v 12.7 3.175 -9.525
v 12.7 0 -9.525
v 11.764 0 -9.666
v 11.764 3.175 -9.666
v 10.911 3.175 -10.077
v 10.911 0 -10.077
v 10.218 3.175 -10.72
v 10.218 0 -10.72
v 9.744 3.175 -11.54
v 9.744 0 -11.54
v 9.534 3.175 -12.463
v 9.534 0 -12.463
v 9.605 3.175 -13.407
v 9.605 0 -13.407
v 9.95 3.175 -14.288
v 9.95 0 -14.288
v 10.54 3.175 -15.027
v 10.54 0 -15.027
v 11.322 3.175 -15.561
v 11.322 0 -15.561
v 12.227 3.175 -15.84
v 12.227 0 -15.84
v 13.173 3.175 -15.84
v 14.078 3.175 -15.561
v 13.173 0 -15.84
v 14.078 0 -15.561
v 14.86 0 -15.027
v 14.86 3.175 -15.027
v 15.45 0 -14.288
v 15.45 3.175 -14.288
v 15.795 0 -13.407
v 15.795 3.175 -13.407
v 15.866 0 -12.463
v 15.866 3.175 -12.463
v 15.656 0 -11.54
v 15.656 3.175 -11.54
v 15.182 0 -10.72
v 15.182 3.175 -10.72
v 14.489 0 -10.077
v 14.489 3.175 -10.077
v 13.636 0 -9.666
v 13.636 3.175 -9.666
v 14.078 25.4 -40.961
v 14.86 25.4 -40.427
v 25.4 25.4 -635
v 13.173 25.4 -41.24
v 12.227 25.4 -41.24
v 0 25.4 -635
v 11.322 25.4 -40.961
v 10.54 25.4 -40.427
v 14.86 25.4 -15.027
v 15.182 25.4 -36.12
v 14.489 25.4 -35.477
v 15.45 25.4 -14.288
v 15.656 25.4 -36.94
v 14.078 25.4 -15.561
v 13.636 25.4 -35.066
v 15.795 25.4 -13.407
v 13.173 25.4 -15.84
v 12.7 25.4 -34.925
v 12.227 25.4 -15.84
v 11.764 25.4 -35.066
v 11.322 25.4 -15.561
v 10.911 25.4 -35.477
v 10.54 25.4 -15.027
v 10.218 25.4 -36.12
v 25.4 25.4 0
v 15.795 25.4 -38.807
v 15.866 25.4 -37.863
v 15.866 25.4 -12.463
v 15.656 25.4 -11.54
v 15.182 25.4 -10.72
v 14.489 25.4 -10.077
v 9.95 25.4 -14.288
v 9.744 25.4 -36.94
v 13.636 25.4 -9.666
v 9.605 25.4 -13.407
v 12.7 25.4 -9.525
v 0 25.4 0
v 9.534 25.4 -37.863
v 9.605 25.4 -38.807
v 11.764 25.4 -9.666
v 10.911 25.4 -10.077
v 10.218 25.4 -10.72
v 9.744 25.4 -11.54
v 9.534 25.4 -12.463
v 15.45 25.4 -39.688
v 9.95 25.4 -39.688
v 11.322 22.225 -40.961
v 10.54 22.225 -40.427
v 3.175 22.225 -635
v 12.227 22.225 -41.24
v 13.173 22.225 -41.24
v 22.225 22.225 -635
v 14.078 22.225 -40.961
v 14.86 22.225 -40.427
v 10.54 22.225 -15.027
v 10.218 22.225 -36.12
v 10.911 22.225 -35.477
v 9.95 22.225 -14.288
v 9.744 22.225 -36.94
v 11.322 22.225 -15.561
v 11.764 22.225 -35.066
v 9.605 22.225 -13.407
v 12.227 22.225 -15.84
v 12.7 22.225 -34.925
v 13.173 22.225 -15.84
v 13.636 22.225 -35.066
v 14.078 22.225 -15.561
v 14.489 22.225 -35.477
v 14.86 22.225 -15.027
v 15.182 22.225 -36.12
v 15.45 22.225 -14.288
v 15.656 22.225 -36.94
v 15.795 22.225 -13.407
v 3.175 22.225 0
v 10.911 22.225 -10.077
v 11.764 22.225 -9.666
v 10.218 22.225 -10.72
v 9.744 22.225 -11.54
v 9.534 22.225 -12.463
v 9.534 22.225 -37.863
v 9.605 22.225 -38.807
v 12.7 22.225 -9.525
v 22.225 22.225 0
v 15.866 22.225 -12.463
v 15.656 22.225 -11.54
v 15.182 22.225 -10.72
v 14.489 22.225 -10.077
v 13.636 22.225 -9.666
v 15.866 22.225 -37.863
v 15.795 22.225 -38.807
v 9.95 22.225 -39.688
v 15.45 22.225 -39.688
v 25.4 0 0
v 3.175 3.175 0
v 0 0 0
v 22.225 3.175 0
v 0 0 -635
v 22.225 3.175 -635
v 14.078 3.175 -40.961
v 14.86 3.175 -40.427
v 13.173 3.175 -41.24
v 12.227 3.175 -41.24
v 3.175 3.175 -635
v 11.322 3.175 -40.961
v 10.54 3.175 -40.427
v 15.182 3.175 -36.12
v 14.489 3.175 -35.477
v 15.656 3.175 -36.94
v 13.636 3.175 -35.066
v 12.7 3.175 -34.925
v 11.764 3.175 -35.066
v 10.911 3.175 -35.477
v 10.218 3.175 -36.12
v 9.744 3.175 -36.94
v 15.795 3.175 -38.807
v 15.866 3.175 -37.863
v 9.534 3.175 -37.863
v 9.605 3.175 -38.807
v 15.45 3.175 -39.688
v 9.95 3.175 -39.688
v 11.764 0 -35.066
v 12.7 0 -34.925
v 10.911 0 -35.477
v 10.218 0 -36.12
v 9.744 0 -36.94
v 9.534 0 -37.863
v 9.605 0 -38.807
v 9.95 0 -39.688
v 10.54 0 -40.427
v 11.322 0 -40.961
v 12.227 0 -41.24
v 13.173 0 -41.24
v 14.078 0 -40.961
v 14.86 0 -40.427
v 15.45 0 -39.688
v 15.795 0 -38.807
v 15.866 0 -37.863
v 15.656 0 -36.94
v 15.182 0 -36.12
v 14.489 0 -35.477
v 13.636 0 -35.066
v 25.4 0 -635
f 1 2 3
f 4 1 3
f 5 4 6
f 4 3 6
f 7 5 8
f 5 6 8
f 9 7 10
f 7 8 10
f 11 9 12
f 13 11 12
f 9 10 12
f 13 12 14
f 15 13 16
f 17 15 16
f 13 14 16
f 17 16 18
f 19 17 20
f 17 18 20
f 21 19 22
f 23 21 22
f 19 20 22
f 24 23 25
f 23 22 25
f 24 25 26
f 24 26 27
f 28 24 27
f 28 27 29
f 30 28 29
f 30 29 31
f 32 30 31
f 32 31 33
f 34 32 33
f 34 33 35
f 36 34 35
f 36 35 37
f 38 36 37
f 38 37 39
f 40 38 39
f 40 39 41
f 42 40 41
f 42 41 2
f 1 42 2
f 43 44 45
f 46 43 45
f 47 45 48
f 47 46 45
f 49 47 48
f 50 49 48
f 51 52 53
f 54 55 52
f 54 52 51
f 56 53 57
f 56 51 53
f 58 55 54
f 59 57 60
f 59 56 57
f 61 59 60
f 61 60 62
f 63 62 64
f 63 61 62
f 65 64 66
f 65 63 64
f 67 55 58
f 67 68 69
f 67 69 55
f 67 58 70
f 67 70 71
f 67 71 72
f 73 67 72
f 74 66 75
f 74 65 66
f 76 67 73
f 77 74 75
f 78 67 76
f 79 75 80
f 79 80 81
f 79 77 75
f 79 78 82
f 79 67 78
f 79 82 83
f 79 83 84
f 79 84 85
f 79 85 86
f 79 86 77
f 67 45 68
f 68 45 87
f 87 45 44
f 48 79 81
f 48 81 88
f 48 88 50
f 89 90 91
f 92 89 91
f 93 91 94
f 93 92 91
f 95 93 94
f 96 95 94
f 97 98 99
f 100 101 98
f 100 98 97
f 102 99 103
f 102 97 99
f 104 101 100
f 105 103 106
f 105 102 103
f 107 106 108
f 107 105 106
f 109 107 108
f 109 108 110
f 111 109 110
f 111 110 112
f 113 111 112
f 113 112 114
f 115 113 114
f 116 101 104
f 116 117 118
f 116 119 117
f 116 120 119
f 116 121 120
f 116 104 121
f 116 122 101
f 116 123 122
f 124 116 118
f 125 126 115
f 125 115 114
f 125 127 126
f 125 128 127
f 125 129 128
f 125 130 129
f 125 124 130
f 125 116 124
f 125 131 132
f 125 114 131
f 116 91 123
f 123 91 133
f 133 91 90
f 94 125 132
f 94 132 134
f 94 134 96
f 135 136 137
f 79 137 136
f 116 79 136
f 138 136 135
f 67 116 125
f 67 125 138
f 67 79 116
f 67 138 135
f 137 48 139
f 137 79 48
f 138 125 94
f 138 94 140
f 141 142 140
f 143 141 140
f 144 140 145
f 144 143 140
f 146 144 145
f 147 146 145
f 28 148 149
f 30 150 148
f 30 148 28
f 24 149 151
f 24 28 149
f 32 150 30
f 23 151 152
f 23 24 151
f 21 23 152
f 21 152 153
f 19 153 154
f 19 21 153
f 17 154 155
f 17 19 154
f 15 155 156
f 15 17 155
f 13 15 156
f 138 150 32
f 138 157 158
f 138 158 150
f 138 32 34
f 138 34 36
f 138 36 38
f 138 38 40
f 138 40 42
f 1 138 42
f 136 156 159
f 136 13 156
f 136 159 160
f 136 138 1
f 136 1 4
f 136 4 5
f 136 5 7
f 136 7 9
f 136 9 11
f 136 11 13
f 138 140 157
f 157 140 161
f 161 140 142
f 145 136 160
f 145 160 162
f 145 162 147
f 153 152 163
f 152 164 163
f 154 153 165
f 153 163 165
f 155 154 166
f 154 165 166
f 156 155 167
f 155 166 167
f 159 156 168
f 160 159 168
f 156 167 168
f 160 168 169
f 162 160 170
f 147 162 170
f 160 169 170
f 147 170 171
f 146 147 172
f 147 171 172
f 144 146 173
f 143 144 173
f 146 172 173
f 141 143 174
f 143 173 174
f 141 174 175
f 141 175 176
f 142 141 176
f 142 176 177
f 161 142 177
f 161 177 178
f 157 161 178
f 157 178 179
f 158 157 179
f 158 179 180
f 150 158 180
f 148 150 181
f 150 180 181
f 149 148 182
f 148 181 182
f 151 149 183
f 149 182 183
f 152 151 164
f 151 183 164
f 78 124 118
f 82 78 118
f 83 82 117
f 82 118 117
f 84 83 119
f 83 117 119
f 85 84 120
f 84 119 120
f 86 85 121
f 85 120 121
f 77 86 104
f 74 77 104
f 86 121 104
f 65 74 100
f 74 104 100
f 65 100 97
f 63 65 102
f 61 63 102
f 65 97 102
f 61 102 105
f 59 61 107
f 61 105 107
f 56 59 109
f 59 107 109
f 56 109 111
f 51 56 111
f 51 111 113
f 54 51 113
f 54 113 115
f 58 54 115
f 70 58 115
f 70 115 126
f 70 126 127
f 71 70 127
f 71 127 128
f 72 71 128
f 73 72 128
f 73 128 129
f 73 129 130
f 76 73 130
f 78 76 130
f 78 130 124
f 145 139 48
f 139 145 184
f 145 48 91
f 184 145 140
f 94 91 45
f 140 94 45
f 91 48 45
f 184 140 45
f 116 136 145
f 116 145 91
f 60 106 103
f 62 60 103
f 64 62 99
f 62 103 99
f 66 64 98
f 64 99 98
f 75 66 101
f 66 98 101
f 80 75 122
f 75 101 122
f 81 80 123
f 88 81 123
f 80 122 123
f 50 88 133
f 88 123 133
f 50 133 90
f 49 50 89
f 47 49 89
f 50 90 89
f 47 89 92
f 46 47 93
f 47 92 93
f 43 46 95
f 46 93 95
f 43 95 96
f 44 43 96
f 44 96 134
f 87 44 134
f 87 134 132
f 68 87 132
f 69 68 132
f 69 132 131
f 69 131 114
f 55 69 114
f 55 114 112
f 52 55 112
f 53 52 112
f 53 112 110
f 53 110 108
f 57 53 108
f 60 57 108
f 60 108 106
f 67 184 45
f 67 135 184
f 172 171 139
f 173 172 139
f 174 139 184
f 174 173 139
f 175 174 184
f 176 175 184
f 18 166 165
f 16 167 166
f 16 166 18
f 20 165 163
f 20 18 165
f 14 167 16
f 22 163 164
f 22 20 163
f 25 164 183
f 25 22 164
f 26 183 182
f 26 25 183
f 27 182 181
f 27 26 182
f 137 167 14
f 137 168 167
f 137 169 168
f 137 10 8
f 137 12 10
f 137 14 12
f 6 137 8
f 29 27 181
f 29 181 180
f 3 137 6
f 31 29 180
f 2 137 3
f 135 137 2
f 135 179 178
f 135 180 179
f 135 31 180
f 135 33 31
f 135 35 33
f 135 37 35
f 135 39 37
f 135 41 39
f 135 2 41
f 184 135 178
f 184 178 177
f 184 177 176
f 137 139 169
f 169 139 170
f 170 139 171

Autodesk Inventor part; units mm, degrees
ref_plane "YZ Plane" through (0, 0, 0) normal (1, 0, 0) x (0, 1, 0)
ref_plane "XZ Plane" through (0, 0, 0) normal (0, 1, 0) x (-1, 0, 0)
ref_plane "XY Plane" through (0, 0, 0) normal (0, 0, 1) x (1, 0, 0)
sketch "Sketch1" plane through (0, 0, 0) normal (0, 0, 1) x (1, 0, 0)
  line L0 (0, 0) -> (25.4, 0)
  line L1 (25.4, 0) -> (25.4, 25.4)
  line L2 (25.4, 25.4) -> (0, 25.4)
  line L3 (0, 25.4) -> (0, 0)
  line L4 (3.175, 22.225) -> (22.225, 22.225)
  line L5 (22.225, 22.225) -> (22.225, 3.175)
  line L6 (22.225, 3.175) -> (3.175, 3.175)
  line L7 (3.175, 3.175) -> (3.175, 22.225)
  dimension "d0" = 25.4
  dimension "d1" = 25.4
  dimension "d2" = 3.175
extrude "Extrusion1" add sketch "Sketch1" against normal blind 635
sketch "Sketch2" plane through (0, 25.4, 0) normal (0, 1, 0) x (1, 0, 0)
  line L0 (25.4, 0) -> (0, 0) projected
  point P0 (12.7, 12.7)
  point P1 (12.7, 38.1)
  dimension "d5" = 12.7
  dimension "d6" = 25.4
hole "Hole1" at (12.7, 25.4, -12.7) at (12.7, 25.4, -38.1) direction (0, -1, 0) diameter 6.35 depth 25.4 tip angle 118
properties part number "tophalf tallthing"
